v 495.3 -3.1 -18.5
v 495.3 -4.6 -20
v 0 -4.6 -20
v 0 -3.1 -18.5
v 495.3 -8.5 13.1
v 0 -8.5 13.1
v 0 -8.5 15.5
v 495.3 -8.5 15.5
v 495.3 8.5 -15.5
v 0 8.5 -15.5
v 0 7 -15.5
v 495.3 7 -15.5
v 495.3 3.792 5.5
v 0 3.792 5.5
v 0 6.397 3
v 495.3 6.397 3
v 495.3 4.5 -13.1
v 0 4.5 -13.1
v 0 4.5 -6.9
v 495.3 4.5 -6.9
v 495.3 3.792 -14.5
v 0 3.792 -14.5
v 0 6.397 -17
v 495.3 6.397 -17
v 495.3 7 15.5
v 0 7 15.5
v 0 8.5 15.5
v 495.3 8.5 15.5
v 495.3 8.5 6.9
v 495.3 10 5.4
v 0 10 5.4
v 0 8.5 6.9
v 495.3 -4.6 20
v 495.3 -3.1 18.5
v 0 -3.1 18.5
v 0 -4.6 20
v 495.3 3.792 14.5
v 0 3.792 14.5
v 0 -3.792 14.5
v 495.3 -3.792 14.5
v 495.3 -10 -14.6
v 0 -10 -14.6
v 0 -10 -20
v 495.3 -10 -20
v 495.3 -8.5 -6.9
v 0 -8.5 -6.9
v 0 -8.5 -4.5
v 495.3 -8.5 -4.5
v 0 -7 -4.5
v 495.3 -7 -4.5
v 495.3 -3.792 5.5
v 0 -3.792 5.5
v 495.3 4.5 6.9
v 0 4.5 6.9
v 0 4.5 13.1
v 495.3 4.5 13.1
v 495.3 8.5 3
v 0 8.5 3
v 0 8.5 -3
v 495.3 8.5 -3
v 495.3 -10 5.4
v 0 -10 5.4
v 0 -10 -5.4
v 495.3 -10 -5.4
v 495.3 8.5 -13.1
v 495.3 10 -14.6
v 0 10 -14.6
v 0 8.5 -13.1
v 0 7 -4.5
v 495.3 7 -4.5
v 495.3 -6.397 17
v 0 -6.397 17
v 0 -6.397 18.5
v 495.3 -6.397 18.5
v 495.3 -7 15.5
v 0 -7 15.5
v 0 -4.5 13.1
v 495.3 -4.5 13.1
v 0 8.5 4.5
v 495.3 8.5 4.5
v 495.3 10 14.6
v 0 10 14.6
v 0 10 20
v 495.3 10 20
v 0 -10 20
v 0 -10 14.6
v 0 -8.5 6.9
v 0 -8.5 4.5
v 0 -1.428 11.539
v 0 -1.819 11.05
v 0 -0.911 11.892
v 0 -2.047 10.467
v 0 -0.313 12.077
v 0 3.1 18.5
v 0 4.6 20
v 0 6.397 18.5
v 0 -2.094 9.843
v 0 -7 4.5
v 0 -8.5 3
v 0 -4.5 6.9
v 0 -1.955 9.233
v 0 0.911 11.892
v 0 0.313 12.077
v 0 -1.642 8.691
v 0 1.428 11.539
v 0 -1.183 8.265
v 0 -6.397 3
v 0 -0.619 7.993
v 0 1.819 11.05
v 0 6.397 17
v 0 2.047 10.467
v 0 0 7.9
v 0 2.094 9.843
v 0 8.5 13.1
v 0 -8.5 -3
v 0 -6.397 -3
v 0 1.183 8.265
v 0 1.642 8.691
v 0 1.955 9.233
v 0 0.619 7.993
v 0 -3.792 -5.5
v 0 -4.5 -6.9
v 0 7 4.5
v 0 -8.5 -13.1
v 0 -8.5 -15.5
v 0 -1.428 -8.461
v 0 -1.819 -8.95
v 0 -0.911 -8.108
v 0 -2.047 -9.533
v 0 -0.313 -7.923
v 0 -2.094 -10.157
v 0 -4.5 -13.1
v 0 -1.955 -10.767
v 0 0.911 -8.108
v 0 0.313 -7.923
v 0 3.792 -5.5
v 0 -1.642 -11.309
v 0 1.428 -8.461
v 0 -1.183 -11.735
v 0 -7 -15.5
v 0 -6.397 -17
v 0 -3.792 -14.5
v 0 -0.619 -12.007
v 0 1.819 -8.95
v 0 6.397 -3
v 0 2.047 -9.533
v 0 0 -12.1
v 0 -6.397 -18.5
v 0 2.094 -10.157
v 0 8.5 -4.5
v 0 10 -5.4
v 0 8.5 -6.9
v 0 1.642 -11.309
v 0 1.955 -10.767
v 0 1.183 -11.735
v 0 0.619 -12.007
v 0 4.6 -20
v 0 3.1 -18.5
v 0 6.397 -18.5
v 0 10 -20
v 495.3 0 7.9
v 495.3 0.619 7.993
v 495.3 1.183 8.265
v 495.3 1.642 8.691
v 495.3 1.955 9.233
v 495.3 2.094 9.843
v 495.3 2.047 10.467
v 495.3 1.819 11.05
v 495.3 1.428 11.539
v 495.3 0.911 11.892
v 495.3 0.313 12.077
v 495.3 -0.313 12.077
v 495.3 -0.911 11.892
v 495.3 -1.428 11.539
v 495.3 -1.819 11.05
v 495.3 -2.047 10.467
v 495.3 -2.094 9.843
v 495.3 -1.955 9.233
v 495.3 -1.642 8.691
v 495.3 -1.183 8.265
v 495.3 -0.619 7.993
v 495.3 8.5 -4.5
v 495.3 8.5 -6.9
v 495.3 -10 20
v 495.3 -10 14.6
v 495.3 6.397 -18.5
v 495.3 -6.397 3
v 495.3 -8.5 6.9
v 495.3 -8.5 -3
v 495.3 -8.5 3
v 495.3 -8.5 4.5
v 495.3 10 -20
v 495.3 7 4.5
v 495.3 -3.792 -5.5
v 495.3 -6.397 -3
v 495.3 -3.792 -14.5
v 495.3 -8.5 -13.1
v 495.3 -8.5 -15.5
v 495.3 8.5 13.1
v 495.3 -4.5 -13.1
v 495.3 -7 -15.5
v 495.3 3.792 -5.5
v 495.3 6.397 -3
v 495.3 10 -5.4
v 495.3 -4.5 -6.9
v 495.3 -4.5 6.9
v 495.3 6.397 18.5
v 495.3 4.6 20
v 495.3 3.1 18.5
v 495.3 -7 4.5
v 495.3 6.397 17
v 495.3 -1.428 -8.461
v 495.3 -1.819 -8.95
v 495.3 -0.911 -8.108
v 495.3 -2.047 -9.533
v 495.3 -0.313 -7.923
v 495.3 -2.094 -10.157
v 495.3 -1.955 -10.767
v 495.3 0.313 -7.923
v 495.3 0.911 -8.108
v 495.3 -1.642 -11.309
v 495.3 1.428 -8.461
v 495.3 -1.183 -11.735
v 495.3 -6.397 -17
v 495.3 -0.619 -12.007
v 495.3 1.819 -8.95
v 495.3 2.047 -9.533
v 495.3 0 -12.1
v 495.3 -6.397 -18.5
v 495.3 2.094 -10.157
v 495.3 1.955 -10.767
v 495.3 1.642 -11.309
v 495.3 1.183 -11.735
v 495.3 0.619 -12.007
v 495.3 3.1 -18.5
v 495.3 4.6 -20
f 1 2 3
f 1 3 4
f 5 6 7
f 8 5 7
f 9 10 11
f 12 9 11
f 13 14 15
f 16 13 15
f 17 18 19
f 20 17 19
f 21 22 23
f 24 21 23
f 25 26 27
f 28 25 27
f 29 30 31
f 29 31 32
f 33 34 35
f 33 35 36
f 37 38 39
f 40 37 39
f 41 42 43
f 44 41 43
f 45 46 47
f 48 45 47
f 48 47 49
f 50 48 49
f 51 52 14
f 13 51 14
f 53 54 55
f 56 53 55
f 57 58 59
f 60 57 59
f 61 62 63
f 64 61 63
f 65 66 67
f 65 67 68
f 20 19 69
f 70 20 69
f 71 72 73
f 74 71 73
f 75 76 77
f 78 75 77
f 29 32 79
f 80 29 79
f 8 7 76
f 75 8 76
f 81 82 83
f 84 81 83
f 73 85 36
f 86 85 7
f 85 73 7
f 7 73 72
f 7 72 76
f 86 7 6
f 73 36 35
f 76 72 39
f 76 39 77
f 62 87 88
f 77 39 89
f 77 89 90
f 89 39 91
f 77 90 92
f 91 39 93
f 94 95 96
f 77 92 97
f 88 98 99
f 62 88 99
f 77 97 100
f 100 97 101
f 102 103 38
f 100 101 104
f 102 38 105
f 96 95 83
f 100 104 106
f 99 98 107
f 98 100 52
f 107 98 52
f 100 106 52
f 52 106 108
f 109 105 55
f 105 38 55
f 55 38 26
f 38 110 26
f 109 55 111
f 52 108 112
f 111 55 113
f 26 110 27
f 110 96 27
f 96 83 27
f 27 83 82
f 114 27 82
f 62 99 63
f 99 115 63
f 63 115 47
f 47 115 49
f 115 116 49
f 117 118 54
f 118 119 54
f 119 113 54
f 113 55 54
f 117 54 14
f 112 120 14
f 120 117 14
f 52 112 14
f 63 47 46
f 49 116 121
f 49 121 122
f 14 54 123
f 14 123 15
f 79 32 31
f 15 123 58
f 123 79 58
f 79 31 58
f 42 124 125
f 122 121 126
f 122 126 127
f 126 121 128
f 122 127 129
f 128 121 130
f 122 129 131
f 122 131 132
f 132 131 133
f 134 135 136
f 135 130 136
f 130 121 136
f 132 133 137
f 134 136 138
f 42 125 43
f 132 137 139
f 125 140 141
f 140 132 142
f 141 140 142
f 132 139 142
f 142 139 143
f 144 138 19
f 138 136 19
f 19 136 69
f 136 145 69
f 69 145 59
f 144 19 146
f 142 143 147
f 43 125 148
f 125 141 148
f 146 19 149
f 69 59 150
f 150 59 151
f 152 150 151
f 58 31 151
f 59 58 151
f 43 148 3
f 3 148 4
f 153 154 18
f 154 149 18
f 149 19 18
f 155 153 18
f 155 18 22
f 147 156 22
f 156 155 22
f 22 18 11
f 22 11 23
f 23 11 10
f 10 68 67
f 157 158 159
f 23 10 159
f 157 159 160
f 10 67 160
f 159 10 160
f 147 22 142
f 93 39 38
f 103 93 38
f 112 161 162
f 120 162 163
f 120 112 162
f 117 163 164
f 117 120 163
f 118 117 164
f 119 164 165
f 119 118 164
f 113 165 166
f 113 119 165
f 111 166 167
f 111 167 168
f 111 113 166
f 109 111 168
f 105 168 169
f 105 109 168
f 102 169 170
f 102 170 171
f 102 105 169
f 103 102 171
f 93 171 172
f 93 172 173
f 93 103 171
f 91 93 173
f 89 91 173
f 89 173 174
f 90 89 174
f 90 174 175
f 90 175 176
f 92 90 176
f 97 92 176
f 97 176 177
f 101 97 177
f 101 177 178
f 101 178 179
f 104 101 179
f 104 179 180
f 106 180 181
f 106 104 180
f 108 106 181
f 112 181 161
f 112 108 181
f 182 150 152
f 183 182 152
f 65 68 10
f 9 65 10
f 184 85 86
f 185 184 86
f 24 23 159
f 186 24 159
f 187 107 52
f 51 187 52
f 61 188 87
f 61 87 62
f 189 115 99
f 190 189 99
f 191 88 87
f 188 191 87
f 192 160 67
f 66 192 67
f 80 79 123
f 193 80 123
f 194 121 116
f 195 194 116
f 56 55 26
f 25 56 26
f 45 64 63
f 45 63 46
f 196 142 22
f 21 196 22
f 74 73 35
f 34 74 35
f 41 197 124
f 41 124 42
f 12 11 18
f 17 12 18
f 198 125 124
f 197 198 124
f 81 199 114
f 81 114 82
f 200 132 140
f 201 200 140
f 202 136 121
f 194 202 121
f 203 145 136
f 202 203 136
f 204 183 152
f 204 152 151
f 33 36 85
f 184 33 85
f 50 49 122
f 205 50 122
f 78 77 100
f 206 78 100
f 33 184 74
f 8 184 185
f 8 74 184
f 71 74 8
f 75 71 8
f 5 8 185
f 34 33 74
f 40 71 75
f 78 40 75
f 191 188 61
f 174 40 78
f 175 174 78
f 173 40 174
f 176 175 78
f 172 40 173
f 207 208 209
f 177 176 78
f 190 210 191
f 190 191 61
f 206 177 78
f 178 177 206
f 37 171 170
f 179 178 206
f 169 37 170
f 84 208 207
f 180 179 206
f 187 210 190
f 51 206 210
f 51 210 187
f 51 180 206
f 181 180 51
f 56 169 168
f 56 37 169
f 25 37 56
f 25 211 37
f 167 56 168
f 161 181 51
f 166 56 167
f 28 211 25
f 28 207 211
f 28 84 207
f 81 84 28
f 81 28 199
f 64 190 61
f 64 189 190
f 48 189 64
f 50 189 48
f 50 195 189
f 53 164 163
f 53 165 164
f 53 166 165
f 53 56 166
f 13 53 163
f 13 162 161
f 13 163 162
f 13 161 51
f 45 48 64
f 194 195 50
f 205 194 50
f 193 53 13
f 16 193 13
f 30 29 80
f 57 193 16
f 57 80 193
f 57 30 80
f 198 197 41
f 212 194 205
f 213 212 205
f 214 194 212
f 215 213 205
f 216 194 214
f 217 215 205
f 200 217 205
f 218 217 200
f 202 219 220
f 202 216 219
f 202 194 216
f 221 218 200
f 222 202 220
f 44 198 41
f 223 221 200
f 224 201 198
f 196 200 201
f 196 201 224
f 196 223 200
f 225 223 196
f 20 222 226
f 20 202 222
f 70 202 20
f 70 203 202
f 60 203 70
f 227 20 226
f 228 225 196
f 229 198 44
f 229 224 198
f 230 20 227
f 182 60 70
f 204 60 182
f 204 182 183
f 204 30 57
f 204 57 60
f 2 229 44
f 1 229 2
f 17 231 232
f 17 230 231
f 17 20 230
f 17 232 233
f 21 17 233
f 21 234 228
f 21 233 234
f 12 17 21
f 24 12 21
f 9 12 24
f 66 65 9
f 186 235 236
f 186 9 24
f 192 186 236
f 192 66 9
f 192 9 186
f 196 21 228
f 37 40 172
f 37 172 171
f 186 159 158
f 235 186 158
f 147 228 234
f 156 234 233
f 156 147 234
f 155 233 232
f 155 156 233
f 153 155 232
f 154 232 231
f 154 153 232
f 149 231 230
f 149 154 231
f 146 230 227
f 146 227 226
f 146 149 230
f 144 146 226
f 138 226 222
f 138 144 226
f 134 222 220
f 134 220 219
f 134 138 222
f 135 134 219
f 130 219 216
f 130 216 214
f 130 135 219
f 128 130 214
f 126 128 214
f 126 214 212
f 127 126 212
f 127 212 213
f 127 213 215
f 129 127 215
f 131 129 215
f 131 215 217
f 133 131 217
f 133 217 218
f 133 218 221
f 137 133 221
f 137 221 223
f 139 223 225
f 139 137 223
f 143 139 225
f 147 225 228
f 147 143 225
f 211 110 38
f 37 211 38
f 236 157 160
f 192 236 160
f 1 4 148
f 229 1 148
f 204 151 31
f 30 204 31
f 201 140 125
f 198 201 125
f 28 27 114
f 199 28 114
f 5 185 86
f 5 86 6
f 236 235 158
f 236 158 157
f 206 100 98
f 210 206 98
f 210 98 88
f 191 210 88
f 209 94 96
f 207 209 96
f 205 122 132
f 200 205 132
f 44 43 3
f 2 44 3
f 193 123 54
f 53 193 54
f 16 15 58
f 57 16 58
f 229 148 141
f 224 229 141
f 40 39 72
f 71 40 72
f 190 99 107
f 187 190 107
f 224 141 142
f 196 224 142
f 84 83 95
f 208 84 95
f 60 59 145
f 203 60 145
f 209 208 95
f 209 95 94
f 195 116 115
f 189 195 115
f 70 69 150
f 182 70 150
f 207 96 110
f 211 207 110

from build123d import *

# Parameters (mm, degrees)
SKETCH1_R           = 2.1
BOSS_EXTRUDE2_DEPTH = 495.3


with BuildPart() as part:
    # Sketch1 → Boss-Extrude2 (new body)
    with BuildSketch(Plane(origin=(0, 0, 0), x_dir=(0, 0, -1), z_dir=(1, 0, 0))):
        Polygon((-20, -4.6), (-20, -10), (-14.6, -10), (-13.1, -8.5), (-15.5, -8.5), (-15.5, -7), (-13.1, -4.5), (-6.9, -4.5), (-4.5, -7), (-4.5, -8.5), (-6.9, -8.5), (-5.4, -10), (0, -10), (0, -8.5), (-3, -8.5), (-3, -6.396534569), (-5.5, -3.792367902), (-5.5, 3.792367902), (-3, 6.396534569), (-3, 8.5), (0, 8.5), (0, 10), (-5.4, 10), (-6.9, 8.5), (-4.5, 8.5), (-4.5, 7), (-6.9, 4.5), (-13.1, 4.5), (-15.5, 7), (-15.5, 8.5), (-13.1, 8.5), (-14.6, 10), (-20, 10), (-20, 4.6), (-18.5, 3.1), (-18.5, 6.396534569), (-17, 6.396534569), (-14.5, 3.792367902), (-14.5, -3.792367902), (-17, -6.396534569), (-18.5, -6.396534569), (-18.5, -3.1), align=None)
        with Locations((-10, 0)):
            Circle(SKETCH1_R, mode=Mode.SUBTRACT)
        Polygon((0, -8.5), (0, -10), (5.4, -10), (6.9, -8.5), (4.5, -8.5), (4.5, -7), (6.9, -4.5), (13.1, -4.5), (15.5, -7), (15.5, -8.5), (13.1, -8.5), (14.6, -10), (20, -10), (20, -4.6), (18.5, -3.1), (18.5, -6.396534569), (17, -6.396534569), (14.5, -3.792367902), (14.5, 3.792367902), (17, 6.396534569), (18.5, 6.396534569), (18.5, 3.1), (20, 4.6), (20, 10), (14.6, 10), (13.1, 8.5), (15.5, 8.5), (15.5, 7), (13.1, 4.5), (6.9, 4.5), (4.5, 7), (4.5, 8.5), (6.9, 8.5), (5.4, 10), (0, 10), (0, 8.5), (3, 8.5), (3, 6.396534569), (5.5, 3.792367902), (5.5, -3.792367902), (3, -6.396534569), (3, -8.5), align=None)
        with Locations((10, 0)):
            Circle(SKETCH1_R, mode=Mode.SUBTRACT)
    extrude(amount=BOSS_EXTRUDE2_DEPTH)


solid = part.part
